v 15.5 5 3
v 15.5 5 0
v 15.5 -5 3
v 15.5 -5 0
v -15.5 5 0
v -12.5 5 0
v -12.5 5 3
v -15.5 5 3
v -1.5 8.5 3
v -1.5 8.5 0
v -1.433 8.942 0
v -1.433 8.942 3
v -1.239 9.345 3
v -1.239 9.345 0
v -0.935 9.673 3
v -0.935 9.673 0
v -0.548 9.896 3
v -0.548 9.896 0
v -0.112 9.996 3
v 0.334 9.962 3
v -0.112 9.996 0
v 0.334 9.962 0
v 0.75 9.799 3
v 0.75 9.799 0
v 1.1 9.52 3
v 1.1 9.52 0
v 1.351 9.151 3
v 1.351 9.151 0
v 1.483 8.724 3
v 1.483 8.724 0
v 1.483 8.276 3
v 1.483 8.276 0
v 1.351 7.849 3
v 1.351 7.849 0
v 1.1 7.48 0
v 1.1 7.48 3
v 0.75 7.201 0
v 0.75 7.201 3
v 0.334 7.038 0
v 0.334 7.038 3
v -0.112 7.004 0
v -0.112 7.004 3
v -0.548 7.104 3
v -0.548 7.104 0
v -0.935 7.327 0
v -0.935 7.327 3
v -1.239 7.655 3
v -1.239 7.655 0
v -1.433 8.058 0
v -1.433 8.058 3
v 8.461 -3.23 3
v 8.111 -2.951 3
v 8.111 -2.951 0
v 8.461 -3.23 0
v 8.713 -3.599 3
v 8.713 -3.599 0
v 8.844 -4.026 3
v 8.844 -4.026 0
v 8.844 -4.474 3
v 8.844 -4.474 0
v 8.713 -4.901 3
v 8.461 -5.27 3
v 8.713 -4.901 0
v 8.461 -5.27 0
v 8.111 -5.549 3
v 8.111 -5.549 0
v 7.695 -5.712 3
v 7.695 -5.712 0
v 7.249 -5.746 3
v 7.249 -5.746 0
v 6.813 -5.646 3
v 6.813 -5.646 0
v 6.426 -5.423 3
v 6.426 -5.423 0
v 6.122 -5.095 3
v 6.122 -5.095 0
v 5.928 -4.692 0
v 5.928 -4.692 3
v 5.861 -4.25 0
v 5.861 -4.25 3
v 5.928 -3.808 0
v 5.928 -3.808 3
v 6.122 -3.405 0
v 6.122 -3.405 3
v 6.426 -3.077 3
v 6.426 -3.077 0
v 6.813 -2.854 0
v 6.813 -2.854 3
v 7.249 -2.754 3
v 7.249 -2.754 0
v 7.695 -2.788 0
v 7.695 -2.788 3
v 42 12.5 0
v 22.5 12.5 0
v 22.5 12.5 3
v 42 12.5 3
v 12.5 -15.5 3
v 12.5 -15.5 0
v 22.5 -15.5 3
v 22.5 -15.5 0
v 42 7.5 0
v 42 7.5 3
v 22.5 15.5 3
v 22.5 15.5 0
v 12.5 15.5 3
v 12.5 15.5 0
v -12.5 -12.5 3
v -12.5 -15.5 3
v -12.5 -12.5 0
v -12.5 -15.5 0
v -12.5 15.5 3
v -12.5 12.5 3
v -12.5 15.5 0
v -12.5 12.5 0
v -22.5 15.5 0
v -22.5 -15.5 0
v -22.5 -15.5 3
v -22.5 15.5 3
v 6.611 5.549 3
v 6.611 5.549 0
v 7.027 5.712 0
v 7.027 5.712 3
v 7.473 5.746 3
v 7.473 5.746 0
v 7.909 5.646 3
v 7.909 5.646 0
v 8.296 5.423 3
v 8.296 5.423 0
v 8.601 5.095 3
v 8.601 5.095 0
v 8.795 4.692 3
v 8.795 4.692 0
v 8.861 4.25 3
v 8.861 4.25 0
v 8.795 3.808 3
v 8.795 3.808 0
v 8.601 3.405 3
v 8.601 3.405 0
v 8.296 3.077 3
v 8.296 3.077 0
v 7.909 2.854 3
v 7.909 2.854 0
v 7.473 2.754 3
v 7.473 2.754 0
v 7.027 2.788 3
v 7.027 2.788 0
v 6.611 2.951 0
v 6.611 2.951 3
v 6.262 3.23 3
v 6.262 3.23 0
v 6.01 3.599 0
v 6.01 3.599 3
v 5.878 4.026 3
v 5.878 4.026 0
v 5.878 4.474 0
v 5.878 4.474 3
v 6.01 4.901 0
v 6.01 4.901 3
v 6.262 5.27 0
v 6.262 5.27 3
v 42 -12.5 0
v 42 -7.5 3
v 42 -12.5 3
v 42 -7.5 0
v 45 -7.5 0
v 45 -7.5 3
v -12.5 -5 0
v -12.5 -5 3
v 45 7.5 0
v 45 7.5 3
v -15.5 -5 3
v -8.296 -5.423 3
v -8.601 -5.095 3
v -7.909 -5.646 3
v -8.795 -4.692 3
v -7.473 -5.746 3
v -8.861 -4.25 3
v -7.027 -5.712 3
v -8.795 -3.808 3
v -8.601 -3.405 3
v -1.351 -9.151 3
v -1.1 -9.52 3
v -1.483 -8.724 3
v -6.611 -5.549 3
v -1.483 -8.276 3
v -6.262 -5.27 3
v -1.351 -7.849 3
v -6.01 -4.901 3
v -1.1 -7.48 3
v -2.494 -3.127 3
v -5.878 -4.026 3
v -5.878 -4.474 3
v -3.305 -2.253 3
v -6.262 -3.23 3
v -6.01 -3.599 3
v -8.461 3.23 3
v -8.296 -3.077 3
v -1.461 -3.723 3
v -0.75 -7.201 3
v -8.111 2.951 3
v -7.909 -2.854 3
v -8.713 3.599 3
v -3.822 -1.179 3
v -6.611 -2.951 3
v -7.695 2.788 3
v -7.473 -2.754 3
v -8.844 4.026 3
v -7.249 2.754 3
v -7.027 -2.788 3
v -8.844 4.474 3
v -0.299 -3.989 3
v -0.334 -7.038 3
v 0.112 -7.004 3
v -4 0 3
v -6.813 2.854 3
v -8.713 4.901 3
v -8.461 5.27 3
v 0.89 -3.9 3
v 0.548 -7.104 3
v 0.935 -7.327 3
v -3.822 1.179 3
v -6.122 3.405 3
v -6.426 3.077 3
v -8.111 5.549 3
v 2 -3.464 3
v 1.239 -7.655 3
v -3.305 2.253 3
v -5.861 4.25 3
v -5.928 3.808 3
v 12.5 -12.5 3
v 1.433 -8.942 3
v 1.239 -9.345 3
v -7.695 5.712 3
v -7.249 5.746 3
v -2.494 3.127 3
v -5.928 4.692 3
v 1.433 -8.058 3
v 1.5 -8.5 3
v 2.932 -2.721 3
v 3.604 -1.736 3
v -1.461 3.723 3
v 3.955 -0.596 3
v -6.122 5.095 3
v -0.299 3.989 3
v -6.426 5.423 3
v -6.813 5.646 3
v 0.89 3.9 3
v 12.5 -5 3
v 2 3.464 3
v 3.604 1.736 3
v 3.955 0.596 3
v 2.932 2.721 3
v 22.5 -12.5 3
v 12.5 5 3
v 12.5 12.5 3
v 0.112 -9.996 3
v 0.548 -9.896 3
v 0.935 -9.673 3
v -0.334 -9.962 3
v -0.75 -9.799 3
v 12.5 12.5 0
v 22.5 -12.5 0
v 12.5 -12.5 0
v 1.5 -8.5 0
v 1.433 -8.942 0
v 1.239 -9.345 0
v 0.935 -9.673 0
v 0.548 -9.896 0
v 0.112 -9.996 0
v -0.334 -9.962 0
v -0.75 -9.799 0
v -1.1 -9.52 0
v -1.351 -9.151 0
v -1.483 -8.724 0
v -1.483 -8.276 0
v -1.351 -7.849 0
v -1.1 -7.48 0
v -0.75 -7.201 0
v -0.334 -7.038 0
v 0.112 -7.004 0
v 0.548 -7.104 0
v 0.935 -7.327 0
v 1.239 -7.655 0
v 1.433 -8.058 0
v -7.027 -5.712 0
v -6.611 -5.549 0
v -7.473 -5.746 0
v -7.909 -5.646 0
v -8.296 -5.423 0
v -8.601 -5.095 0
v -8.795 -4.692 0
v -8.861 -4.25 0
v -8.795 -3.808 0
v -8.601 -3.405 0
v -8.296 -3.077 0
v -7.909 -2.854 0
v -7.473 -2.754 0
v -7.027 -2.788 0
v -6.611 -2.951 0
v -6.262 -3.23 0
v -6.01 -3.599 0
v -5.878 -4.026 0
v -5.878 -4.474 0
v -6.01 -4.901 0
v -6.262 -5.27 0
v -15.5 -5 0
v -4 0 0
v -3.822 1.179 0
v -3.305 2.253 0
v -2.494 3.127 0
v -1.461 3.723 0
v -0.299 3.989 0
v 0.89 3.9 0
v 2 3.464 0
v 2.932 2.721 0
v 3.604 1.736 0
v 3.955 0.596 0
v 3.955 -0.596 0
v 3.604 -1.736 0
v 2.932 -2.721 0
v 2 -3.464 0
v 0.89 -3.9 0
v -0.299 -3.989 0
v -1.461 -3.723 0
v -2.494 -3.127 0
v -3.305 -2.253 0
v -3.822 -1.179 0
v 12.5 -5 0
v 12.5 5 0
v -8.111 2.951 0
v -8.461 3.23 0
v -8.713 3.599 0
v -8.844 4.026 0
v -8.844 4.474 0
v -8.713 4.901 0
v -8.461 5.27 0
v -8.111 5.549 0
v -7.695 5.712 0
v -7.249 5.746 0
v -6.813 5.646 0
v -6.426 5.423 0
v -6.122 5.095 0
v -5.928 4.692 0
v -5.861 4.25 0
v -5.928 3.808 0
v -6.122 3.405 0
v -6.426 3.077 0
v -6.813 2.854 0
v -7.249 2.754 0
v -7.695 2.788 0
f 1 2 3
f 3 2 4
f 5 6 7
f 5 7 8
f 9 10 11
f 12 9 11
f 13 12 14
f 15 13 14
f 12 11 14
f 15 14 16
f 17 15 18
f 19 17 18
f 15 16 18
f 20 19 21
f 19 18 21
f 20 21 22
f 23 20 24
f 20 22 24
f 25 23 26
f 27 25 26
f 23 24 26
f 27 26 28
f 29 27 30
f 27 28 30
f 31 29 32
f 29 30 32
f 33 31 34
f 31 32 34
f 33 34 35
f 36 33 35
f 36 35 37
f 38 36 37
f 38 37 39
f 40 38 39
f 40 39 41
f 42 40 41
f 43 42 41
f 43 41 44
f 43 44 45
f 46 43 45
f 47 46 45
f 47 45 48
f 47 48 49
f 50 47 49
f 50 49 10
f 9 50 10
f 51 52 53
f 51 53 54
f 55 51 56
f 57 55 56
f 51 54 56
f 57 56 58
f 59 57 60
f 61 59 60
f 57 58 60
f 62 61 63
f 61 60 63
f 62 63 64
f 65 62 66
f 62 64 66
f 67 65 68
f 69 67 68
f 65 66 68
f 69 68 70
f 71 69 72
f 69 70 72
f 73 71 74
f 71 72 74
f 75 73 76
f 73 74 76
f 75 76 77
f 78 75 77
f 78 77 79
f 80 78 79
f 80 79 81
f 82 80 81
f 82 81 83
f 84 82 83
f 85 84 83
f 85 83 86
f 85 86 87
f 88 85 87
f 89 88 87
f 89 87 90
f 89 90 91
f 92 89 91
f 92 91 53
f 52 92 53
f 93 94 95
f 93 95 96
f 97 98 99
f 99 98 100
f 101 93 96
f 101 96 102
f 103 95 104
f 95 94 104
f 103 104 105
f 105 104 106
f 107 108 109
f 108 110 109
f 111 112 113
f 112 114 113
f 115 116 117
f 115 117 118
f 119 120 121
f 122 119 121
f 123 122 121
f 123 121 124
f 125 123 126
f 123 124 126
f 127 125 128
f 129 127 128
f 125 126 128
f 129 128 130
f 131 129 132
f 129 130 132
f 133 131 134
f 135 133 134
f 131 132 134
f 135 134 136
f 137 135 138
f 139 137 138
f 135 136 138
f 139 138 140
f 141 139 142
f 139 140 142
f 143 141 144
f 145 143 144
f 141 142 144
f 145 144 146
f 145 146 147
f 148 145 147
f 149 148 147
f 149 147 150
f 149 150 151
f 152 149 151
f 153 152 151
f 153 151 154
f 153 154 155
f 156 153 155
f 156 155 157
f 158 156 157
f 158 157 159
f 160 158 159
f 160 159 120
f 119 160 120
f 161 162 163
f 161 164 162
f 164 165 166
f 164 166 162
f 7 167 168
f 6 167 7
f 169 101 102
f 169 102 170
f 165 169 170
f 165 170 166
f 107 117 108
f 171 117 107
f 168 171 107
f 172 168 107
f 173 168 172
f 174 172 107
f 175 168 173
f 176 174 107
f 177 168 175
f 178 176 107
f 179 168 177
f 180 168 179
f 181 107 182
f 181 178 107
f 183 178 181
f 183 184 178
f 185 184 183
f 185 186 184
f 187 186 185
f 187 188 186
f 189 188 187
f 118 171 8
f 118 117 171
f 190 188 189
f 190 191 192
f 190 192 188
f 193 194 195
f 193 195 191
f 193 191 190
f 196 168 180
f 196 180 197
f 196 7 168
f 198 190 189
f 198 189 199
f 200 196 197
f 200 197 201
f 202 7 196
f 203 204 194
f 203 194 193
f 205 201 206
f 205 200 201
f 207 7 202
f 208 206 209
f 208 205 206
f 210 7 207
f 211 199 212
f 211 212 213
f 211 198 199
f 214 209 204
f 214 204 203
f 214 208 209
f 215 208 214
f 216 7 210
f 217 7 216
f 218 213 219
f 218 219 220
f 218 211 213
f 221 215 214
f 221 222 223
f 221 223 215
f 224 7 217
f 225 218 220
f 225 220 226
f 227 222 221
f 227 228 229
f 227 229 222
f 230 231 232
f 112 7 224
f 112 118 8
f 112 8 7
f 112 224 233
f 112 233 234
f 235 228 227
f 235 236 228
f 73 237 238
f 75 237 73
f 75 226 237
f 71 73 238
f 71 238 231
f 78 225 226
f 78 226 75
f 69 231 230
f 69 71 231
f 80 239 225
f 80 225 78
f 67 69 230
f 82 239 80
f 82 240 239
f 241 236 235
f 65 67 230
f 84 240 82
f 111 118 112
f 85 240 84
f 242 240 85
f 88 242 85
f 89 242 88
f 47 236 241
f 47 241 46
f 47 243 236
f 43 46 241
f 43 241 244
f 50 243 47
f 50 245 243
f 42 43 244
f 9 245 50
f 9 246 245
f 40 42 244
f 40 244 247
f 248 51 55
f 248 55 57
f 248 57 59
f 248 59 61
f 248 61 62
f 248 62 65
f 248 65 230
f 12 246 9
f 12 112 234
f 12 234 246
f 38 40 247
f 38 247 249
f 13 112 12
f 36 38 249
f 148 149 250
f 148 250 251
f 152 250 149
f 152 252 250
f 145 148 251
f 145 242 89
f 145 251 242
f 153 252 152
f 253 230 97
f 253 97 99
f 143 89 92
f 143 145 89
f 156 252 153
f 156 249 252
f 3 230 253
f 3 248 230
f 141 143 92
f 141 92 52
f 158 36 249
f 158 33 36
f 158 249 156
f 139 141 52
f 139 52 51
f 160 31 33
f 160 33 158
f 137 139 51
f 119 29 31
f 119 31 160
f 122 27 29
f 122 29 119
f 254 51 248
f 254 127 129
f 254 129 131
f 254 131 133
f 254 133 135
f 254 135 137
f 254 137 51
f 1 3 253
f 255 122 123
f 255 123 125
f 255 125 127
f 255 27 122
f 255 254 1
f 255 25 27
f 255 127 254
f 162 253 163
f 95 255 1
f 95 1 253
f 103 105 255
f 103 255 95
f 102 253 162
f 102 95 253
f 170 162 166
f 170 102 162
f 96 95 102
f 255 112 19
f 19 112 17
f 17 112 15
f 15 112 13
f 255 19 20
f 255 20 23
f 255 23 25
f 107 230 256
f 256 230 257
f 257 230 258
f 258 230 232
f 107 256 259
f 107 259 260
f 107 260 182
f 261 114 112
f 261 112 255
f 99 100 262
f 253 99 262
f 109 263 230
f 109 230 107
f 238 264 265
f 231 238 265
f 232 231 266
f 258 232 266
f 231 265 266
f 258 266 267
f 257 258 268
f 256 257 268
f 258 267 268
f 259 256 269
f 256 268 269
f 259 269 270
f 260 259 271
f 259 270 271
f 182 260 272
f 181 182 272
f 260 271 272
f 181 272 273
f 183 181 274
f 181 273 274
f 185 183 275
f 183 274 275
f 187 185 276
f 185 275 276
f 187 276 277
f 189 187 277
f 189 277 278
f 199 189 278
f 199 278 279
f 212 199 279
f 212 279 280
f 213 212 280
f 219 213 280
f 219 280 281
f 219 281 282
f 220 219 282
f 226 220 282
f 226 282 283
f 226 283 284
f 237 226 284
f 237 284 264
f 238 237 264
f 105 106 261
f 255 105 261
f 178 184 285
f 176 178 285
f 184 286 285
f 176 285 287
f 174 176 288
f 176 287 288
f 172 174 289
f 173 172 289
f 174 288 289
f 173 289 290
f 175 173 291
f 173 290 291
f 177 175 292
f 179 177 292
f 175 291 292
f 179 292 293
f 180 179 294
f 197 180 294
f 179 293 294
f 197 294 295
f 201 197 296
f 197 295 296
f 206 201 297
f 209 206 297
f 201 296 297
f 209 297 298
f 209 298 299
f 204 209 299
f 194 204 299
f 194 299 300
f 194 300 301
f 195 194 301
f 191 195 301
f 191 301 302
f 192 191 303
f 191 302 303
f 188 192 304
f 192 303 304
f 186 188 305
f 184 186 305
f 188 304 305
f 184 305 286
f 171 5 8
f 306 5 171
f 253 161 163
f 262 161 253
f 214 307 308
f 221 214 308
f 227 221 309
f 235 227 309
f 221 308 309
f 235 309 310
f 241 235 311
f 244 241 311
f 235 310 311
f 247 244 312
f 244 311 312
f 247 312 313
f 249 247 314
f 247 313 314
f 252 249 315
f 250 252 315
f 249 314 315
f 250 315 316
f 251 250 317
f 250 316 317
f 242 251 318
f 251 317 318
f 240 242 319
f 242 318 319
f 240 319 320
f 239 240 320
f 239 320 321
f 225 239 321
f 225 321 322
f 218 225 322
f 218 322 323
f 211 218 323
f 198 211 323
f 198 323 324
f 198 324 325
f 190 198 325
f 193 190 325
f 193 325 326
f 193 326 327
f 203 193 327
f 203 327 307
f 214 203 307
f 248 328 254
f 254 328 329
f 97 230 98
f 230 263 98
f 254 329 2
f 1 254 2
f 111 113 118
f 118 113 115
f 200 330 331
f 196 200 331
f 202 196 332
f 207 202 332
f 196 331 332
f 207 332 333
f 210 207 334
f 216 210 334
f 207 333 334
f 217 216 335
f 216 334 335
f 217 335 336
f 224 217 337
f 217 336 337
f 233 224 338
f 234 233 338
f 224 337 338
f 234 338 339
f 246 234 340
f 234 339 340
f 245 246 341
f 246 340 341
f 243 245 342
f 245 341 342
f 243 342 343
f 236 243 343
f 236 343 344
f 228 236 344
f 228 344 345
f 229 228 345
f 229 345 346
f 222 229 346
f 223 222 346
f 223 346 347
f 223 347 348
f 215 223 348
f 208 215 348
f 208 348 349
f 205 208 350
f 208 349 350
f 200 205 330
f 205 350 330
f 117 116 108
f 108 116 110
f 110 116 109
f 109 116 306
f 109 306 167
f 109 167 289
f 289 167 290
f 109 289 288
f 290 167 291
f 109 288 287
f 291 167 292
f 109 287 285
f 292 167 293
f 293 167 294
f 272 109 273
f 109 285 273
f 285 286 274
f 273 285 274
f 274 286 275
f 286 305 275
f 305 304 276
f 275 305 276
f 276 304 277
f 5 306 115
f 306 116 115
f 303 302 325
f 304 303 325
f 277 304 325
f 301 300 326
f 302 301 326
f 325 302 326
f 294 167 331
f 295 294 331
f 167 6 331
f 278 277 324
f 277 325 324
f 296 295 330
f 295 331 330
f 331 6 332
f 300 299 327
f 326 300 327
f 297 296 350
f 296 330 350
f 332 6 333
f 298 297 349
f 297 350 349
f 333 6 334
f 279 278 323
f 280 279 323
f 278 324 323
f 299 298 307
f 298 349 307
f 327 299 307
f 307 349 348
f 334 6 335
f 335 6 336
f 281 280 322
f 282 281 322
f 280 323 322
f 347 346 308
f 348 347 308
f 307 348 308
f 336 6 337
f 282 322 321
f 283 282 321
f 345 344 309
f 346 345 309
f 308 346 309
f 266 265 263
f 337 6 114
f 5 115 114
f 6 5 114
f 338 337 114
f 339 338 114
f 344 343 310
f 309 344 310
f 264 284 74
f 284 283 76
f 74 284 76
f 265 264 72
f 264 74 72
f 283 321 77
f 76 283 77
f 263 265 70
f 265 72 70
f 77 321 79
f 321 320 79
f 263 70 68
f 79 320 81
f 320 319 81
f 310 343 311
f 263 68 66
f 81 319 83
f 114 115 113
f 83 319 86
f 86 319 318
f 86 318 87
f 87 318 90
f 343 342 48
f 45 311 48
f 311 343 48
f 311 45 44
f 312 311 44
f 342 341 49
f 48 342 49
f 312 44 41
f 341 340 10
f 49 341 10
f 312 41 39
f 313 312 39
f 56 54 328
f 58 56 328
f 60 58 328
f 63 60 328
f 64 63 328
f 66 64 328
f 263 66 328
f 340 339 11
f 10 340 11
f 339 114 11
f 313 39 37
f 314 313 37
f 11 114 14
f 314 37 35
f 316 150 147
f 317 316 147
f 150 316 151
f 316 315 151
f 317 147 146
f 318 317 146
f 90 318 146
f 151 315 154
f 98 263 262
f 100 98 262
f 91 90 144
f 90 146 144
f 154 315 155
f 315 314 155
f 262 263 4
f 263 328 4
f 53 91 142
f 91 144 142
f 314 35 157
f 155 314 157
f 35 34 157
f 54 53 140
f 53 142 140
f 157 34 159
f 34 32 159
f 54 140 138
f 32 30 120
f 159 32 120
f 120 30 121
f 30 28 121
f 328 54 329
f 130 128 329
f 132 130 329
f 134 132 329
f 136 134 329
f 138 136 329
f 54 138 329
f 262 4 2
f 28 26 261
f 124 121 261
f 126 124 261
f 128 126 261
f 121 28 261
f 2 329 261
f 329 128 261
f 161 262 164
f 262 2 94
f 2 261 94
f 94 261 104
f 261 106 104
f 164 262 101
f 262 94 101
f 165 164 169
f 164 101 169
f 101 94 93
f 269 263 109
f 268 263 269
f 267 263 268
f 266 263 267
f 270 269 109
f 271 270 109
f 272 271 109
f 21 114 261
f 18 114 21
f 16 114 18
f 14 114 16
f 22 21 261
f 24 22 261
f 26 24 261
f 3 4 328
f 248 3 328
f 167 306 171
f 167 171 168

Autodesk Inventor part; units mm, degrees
ref_plane "YZ Plane" through (0, 0, 0) normal (1, 0, 0) x (0, 1, 0)
ref_plane "XZ Plane" through (0, 0, 0) normal (0, 1, 0) x (-1, 0, 0)
ref_plane "XY Plane" through (0, 0, 0) normal (0, 0, 1) x (1, 0, 0)
sketch "Sketch1" plane through (0, 0, 0) normal (0, 0, 1) x (1, 0, 0)
  circle A0 centre (0, 0) radius 12.5 construction
  circle A1 centre (0, 8.5) radius 1.5 construction
  circle A2 centre (-7.3612, 4.25) radius 1.5 construction
  circle A3 centre (-7.3612, -4.25) radius 1.5 construction
  circle A4 centre (0, -8.5) radius 1.5 construction
  circle A5 centre (7.3612, -4.25) radius 1.5 construction
  circle A6 centre (7.3612, 4.25) radius 1.5 construction
  circle A7 centre (0, 0) radius 4 construction
  line L0 (45, -12.5) -> (-22.5, -12.5) construction
  line L1 (-22.5, -12.5) -> (-22.5, 12.5) construction
  line L2 (-22.5, 12.5) -> (45, 12.5) construction
  line L3 (45, 12.5) -> (45, -12.5) construction
  line L4 (45, -12.5) -> (-22.5, 12.5) construction
  line L5 (-22.5, -12.5) -> (45, 12.5) construction
  line L6 (-22.5, -12.5) -> (-12.5, -12.5) construction
  line L7 (-12.5, -12.5) -> (-12.5, -15.5) construction
  line L8 (-12.5, -15.5) -> (-22.5, -15.5) construction
  line L9 (-22.5, -15.5) -> (-22.5, -12.5) construction
  line L10 (12.5, -12.5) -> (22.5, -12.5) construction
  line L11 (22.5, -12.5) -> (22.5, -15.5) construction
  line L12 (22.5, -15.5) -> (12.5, -15.5) construction
  line L13 (12.5, -15.5) -> (12.5, -12.5) construction
  line L14 (-22.5, 12.5) -> (-12.5, 12.5) construction
  line L15 (-12.5, 12.5) -> (-12.5, 15.5) construction
  line L16 (-12.5, 15.5) -> (-22.5, 15.5) construction
  line L17 (-22.5, 15.5) -> (-22.5, 12.5) construction
  line L18 (12.5, 12.5) -> (22.5, 12.5) construction
  line L19 (22.5, 12.5) -> (22.5, 15.5) construction
  line L20 (22.5, 15.5) -> (12.5, 15.5) construction
  line L21 (12.5, 15.5) -> (12.5, 12.5) construction
  line L22 (45, 12.5) -> (42, 12.5) construction
  line L23 (42, 12.5) -> (42, 7.5) construction
  line L24 (42, 7.5) -> (45, 7.5) construction
  line L25 (45, 7.5) -> (45, 12.5) construction
  line L26 (45, -12.5) -> (42, -12.5) construction
  line L27 (42, -12.5) -> (42, -7.5) construction
  line L28 (42, -7.5) -> (45, -7.5) construction
  line L29 (45, -7.5) -> (45, -12.5) construction
  point P0 (11.25, 0)
  dimension "d0" = 25
  dimension "d1" = 3
  dimension "d2" = 8.5
  dimension "d5" = 360
  dimension "d7" = 8
  dimension "d8" = 10
  dimension "d9" = 3
  dimension "d10" = 10
  dimension "d11" = 3
  dimension "d12" = 22.5
  dimension "d13" = 10
  dimension "d14" = 3
  dimension "d15" = 10
  dimension "d16" = 3
  dimension "d17" = 3
  dimension "d18" = 5
  dimension "d19" = 3
  dimension "d20" = 5
sketch "Sketch2" plane through (0, 0, 0) normal (0, 0, 1) x (1, 0, 0)
  line L0 (45, -12.5) -> (-22.5, -12.5) construction
  line L1 (-22.5, -12.5) -> (-22.5, 12.5) construction
  line L2 (-22.5, 12.5) -> (45, 12.5) construction
  line L3 (-22.5, 12.5) -> (45, 12.5)
  line L4 (45, 12.5) -> (45, -12.5)
  line L5 (45, -12.5) -> (-22.5, -12.5)
  line L6 (-22.5, -12.5) -> (-22.5, 12.5)
  point P0 (0, 0)
extrude "Extrusion1" add sketch "Sketch2" along normal blind 3
sketch "Sketch3" plane through (0, 0, 0) normal (0, 0, -1) x (-1, 0, 0)
  line L0 (12.5, 15.5) -> (22.5, 15.5) construction
  line L1 (12.5, 12.5) -> (12.5, 15.5) construction
  line L2 (22.5, 12.5) -> (12.5, 12.5)
  line L3 (12.5, 12.5) -> (12.5, 15.5)
  line L4 (12.5, 15.5) -> (22.5, 15.5)
  line L5 (22.5, 15.5) -> (22.5, 12.5)
  line L6 (-22.5, 15.5) -> (-12.5, 15.5) construction
  line L7 (-22.5, 12.5) -> (-22.5, 15.5) construction
  line L8 (-12.5, 15.5) -> (-12.5, 12.5) construction
  line L9 (-12.5, 12.5) -> (-22.5, 12.5)
  line L10 (-22.5, 12.5) -> (-22.5, 15.5)
  line L11 (-22.5, 15.5) -> (-12.5, 15.5)
  line L12 (-12.5, 15.5) -> (-12.5, 12.5)
  point P0 (0, 0)
extrude "Extrusion2" add sketch "Sketch3" against normal blind 3
sketch "Sketch4" plane through (0, 0, 0) normal (0, 0, -1) x (-1, 0, 0)
  line L0 (-42, 12.5) -> (-42, 7.5) construction
  line L1 (-42, 7.5) -> (-45, 7.5) construction
  line L2 (-45, 12.5) -> (-42, 12.5)
  line L3 (-42, 12.5) -> (-42, 7.5)
  line L4 (-42, 7.5) -> (-45, 7.5)
  line L5 (-45, 7.5) -> (-45, 12.5)
  point P0 (0, 0)
extrude "Extrusion3" cut sketch "Sketch4" against normal blind 3
sketch "Sketch5" plane through (0, 0, 0) normal (0, 0, -1) x (-1, 0, 0)
  circle A0 centre (0, 0) radius 4 construction
  circle A1 centre (0, 8.5) radius 1.5 construction
  circle A2 centre (0, 0) radius 4
extrude "Extrusion4" cut sketch "Sketch5" against normal blind 3
sketch "Sketch6" plane through (0, 0, 0) normal (0, 0, -1) x (-1, 0, 0)
  circle A0 centre (0, 8.5) radius 1.5 construction
  circle A1 centre (0, 8.5) radius 1.5
  point P0 (0, 0)
extrude "Extrusion5" cut sketch "Sketch6" against normal blind 3
mirror "Mirror1" about plane through (0, 0, 0) normal (0, 1, 0) of "Extrusion2", "Extrusion3"
pattern_circular "Circular Pattern1" count 6 over 360 about axis through (0, 0, 0) along (0, 0, 1) of "Extrusion5"
sketch "Sketch7" plane through (0, 0, 0) normal (0, 0, -1) x (-1, 0, 0)
  line L0 (12.5, 5) -> (15.5, 5)
  line L1 (15.5, 5) -> (15.5, -5)
  line L2 (15.5, -5) -> (12.5, -5)
  line L3 (12.5, -5) -> (12.5, 5)
  line L4 (12.5, 15.5) -> (12.5, 12.5) projected
  line L5 (22.5, -15.5) -> (22.5, 15.5) projected
  line L6 (-12.5, 5) -> (-15.5, 5)
  line L7 (-15.5, 5) -> (-15.5, -5)
  line L8 (-15.5, -5) -> (-12.5, -5)
  line L9 (-12.5, -5) -> (-12.5, 5)
  line L10 (-12.5, 12.5) -> (-12.5, 15.5) projected
  point P0 (0, 0)
  point P1 (15.5, 0)
  point P2 (22.5, 0)
  dimension "d34" = 3
  dimension "d35" = 10
  dimension "d36" = 3
  dimension "d37" = 10
extrude "Extrusion6" cut sketch "Sketch7" against normal blind 3
properties part number "Motor mount"
